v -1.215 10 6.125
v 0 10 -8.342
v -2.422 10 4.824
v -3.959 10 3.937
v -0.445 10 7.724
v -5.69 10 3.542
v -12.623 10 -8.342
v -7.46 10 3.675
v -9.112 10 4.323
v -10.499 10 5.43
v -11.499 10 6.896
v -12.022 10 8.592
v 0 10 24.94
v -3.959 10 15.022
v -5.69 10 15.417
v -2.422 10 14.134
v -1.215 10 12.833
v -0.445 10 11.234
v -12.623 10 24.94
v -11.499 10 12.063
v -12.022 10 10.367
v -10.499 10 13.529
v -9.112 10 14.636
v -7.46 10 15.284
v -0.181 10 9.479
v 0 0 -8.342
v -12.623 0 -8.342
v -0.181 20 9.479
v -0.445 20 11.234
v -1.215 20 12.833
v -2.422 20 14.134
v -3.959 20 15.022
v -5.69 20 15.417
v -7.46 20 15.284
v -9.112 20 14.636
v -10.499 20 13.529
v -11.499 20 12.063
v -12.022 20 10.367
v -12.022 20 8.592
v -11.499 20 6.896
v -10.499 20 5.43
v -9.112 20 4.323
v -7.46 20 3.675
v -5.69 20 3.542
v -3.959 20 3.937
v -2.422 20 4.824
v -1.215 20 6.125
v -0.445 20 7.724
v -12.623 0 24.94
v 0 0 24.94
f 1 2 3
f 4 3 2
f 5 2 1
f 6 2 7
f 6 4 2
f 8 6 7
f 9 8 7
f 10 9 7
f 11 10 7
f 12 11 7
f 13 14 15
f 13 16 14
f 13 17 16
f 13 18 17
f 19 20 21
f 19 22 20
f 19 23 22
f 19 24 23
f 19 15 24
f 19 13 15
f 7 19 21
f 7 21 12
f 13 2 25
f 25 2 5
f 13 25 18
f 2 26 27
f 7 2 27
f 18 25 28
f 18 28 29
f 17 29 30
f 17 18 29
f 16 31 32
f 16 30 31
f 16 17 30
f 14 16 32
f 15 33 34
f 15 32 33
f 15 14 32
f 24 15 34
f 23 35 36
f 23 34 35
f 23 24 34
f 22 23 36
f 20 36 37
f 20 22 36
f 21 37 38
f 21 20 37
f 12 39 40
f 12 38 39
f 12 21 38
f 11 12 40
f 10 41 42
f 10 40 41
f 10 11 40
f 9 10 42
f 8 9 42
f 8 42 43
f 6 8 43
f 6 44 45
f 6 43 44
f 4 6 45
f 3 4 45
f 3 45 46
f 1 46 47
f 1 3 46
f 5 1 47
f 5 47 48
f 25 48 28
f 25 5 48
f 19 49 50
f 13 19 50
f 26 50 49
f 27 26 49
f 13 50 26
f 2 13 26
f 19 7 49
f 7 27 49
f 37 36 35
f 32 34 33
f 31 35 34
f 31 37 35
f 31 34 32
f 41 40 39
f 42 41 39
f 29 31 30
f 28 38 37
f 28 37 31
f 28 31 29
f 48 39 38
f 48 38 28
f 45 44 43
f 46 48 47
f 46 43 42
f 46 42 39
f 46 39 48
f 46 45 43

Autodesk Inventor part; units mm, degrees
ref_plane "YZ Plane" through (0, 0, 0) normal (1, 0, 0) x (0, 1, 0)
ref_plane "XZ Plane" through (0, 0, 0) normal (0, 1, 0) x (-1, 0, 0)
ref_plane "XY Plane" through (0, 0, 0) normal (0, 0, 1) x (1, 0, 0)
sketch "Sketch1" plane through (0, 0, 0) normal (0, 1, 0) x (-1, 0, 0)
  line L0 (12.6229, 24.94) -> (0, 24.94)
  line L1 (0, 24.94) -> (0, -8.3425)
  line L2 (0, -8.3425) -> (12.6229, -8.3425)
  line L3 (12.6229, -8.3425) -> (12.6229, 24.94)
  line L4 (12.6229, 24.94) -> (0, -8.3425) construction
  line L5 (0, 24.94) -> (12.6229, -8.3425) construction
  point P0 (0, 0)
  point P1 (6.3114, 8.2988)
extrude "Extrusion1" add sketch "Sketch1" along normal blind 10
sketch "Sketch2" plane through (0, 10, 0) normal (0, 1, 0) x (1, 0, 0)
  circle A0 centre (-6.1347, -9.4794) radius 5.954
  point P0 (0, 0)
extrude "Extrusion2" add sketch "Sketch2" along normal blind 10
properties part number "mass applied" material "Iron, Cast"
